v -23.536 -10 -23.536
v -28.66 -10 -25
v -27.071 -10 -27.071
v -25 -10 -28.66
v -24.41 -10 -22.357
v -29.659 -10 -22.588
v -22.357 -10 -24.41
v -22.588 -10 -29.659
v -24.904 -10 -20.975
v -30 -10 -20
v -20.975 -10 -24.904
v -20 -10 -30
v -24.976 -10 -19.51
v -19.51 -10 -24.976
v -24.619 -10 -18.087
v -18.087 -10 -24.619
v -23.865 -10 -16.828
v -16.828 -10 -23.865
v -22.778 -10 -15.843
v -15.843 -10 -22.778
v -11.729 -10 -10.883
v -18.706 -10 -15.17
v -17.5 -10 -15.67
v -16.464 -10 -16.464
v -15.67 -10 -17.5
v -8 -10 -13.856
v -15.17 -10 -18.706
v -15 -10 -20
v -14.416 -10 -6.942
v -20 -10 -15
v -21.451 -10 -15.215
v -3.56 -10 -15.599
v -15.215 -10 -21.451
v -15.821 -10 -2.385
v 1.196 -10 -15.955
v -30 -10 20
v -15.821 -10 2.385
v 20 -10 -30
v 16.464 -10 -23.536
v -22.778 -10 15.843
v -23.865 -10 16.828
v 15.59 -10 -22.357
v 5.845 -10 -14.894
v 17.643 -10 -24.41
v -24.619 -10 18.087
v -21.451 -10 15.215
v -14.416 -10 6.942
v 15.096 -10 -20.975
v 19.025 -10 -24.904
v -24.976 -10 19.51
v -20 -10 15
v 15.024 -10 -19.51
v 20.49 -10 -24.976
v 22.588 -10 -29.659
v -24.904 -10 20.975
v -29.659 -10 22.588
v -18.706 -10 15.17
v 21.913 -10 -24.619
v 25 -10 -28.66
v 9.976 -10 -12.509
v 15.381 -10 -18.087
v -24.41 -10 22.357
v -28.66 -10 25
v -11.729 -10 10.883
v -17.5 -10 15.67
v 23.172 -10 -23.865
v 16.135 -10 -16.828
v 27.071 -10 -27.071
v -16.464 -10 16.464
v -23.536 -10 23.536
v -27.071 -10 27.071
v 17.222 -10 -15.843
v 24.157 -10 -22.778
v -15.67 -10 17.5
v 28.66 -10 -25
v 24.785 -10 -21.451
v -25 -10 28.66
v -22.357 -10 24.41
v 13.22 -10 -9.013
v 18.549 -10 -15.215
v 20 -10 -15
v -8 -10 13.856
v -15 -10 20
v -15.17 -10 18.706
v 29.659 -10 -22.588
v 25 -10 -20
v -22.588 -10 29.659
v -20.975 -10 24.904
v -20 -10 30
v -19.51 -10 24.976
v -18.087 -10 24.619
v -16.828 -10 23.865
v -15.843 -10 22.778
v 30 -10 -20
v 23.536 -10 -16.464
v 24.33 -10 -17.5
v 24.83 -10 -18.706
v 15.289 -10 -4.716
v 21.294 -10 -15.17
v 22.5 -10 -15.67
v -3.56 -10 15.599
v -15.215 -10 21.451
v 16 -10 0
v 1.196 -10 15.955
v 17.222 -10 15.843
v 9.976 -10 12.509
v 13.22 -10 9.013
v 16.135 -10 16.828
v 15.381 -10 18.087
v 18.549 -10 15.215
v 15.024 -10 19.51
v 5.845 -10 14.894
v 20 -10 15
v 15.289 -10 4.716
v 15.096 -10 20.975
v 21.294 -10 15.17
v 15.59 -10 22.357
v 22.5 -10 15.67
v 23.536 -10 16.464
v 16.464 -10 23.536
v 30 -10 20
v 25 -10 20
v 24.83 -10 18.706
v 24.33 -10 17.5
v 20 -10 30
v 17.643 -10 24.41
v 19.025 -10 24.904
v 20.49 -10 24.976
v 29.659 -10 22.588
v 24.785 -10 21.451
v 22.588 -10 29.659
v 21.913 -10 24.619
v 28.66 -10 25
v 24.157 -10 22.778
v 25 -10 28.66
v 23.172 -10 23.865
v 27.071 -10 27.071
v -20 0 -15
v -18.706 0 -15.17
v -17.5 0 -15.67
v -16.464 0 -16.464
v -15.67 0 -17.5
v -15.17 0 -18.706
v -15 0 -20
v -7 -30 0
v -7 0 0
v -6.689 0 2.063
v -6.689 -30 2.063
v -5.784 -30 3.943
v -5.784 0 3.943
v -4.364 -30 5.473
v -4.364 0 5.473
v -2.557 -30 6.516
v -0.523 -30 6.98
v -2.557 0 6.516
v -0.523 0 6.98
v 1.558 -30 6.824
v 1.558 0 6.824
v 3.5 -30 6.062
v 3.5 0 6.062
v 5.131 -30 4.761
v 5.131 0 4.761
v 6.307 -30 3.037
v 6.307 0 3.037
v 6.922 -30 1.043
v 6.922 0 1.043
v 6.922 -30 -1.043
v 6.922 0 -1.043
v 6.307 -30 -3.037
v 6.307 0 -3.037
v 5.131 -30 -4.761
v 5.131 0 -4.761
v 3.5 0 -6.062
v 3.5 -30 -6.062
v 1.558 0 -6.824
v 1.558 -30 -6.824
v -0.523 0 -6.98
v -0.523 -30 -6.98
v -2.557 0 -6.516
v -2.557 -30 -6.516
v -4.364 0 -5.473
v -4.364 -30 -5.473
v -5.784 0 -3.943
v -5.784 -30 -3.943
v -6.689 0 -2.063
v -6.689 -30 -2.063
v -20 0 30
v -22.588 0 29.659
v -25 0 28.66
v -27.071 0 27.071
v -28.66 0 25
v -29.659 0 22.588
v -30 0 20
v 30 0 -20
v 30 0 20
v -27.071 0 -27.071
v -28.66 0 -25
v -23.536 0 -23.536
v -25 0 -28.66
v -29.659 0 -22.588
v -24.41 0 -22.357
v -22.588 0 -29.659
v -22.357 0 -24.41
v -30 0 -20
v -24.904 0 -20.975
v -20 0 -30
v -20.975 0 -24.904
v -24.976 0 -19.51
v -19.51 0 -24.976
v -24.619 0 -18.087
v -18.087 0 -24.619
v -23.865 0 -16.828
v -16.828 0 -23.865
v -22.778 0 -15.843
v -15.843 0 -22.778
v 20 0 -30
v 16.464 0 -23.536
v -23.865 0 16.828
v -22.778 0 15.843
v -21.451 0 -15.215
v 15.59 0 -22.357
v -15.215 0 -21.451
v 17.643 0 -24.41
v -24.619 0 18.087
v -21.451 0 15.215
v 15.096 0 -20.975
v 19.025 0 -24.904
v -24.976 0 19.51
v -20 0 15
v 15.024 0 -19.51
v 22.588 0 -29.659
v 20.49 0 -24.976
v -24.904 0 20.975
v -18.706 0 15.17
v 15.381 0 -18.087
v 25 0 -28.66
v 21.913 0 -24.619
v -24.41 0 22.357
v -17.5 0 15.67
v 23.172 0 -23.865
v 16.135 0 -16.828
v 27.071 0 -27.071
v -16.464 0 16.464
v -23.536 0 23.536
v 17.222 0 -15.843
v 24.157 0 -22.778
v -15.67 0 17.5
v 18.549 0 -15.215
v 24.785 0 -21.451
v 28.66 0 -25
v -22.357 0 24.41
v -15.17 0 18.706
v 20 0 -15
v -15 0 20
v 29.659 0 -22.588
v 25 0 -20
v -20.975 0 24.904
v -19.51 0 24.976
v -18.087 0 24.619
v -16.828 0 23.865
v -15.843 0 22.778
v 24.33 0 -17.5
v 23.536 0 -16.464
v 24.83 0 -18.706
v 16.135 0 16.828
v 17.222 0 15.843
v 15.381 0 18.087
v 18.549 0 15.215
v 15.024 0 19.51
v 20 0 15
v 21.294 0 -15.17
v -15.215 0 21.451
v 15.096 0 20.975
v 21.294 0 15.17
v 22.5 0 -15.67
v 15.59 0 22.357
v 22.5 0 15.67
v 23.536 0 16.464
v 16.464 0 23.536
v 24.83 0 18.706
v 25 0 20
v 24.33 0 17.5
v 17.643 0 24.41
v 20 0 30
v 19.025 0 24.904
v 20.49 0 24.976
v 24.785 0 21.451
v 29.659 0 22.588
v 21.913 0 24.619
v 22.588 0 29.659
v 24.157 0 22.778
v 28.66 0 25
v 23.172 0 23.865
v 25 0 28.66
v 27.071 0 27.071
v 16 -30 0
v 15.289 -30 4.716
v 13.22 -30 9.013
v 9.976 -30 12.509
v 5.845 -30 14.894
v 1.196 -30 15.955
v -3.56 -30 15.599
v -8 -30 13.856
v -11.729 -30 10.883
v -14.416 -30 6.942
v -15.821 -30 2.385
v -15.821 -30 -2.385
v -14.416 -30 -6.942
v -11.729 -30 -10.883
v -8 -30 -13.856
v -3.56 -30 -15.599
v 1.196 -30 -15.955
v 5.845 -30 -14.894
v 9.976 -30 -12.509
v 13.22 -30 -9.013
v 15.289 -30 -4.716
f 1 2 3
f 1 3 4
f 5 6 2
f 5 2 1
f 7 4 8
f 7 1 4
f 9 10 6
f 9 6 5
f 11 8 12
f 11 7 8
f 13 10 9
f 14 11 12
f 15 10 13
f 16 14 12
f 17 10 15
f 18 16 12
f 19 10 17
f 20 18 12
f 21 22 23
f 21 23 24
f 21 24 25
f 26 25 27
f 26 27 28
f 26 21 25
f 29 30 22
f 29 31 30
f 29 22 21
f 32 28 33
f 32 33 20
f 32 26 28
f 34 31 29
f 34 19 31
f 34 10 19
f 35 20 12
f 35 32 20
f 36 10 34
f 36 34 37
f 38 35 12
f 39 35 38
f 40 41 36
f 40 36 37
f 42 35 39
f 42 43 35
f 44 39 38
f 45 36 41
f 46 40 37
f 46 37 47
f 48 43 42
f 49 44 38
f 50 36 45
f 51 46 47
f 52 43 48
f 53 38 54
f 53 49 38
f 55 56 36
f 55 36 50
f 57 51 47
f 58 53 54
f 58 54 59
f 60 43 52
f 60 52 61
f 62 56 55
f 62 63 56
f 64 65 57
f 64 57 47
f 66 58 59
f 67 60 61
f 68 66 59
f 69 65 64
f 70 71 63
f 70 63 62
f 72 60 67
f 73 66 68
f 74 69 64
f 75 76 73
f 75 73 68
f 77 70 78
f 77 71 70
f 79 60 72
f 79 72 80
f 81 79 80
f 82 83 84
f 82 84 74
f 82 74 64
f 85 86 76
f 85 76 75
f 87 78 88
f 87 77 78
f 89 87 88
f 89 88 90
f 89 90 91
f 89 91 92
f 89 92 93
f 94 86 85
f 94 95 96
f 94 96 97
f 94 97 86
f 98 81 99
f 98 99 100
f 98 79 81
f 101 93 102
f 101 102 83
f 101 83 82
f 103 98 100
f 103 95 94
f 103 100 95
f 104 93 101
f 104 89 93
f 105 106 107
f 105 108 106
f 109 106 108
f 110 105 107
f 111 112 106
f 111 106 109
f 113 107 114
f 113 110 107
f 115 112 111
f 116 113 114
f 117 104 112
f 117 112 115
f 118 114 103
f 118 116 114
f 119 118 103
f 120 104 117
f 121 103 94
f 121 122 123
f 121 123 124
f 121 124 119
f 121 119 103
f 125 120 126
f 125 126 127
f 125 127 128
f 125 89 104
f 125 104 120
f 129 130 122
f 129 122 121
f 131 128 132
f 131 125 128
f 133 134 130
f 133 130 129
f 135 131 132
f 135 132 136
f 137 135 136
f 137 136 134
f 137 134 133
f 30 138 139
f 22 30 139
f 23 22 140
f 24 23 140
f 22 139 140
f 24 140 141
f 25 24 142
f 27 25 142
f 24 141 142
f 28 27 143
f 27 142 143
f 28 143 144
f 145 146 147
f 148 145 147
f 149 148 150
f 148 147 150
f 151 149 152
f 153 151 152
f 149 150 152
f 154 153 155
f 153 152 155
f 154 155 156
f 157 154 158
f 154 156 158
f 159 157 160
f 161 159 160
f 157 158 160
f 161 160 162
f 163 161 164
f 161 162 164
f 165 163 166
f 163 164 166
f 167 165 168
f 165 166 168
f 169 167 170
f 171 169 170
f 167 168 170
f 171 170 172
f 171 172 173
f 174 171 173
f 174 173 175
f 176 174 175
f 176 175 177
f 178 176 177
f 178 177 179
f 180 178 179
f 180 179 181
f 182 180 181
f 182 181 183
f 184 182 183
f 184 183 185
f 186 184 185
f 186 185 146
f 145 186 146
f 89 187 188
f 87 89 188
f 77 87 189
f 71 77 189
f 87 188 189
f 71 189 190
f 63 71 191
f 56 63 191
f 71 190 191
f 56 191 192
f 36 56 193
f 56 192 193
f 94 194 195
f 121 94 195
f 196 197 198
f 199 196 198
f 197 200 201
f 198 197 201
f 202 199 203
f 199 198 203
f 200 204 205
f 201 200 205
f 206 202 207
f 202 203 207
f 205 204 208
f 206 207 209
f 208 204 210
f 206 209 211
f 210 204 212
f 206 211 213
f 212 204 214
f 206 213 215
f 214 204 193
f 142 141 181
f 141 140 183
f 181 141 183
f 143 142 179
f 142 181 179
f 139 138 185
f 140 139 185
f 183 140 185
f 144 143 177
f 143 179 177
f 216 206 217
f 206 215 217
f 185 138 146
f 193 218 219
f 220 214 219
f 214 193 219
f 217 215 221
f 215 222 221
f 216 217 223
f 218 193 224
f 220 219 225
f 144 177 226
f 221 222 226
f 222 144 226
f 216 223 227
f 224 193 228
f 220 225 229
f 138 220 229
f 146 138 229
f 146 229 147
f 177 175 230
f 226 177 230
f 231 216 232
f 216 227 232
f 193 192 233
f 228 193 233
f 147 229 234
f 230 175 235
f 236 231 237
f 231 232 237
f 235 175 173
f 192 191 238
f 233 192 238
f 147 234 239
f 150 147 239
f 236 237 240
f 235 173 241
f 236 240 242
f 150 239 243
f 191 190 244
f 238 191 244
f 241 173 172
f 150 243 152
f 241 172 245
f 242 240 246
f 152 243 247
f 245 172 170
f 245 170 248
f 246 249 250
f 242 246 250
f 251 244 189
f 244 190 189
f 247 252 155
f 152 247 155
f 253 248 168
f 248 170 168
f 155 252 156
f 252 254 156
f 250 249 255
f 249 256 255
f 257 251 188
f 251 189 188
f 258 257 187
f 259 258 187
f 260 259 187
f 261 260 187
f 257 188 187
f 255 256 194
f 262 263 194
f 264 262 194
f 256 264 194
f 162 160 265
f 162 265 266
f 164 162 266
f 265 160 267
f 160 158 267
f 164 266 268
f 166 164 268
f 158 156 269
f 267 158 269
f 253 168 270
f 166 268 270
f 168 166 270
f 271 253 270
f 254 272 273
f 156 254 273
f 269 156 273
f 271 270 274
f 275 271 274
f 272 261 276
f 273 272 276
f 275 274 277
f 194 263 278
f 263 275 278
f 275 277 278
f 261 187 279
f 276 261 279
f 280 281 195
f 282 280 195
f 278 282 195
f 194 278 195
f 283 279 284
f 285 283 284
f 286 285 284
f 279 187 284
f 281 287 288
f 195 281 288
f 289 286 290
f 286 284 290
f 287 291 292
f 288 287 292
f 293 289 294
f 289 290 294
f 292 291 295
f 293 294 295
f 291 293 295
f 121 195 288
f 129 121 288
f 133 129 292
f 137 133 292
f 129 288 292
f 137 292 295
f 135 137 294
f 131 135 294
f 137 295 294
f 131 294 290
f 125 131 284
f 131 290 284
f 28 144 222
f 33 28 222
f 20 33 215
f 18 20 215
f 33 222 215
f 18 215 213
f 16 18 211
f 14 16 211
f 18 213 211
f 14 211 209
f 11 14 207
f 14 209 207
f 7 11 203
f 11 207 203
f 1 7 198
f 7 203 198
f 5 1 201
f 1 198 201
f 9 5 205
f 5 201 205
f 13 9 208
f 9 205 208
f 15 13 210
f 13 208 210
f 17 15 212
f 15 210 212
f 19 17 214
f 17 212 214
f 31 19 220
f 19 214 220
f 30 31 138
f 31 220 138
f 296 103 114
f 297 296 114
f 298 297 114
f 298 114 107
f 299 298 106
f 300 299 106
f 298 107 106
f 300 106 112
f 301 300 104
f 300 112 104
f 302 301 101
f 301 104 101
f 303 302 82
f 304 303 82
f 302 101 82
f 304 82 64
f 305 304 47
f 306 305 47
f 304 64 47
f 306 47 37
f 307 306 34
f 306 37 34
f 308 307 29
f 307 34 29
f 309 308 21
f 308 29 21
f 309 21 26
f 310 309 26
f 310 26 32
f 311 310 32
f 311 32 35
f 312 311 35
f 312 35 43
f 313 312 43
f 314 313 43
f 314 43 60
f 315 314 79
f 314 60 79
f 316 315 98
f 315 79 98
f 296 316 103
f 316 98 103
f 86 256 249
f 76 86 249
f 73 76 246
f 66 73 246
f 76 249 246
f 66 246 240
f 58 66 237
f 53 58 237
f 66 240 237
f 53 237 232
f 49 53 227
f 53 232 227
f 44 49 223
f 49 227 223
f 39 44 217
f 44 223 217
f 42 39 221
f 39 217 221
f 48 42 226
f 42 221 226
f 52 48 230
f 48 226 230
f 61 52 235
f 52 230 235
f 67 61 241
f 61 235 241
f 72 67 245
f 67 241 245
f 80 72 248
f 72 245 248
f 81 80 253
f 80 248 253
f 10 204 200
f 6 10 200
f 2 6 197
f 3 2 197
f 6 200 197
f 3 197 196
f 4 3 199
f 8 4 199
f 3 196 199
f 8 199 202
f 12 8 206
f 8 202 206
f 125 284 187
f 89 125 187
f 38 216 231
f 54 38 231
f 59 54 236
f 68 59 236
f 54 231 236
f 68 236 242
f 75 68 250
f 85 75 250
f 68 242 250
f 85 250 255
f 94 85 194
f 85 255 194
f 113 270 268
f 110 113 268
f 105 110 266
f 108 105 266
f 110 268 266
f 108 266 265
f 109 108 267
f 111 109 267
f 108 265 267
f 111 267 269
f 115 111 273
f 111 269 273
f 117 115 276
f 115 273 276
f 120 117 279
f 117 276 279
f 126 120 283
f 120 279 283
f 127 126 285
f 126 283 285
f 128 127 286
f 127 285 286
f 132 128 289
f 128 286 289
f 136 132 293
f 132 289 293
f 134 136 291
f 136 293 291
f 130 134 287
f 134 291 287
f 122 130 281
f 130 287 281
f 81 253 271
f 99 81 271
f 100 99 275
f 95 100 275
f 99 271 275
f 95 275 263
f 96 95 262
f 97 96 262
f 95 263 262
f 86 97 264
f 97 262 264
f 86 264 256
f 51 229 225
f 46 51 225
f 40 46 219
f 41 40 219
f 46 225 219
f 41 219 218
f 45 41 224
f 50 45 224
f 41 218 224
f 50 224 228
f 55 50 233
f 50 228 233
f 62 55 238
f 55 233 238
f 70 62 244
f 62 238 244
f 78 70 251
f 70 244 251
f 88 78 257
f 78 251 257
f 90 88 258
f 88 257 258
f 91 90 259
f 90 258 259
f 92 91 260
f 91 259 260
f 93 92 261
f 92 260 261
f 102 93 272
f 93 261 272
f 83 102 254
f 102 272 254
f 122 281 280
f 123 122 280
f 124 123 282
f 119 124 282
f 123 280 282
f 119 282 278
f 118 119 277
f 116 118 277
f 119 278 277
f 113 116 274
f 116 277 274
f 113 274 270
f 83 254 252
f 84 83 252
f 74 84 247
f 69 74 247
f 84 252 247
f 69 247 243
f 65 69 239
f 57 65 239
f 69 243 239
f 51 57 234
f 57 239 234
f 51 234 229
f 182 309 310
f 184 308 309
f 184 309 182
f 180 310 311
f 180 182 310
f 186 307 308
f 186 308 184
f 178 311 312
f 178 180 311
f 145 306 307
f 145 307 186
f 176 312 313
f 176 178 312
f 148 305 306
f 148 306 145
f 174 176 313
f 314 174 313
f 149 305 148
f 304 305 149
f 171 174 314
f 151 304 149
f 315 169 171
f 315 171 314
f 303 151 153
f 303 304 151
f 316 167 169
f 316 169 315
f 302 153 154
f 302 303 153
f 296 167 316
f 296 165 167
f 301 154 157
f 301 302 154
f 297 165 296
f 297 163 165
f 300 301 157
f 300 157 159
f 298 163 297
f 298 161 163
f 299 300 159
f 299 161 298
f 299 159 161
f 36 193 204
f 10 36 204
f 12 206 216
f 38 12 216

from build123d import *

# Parameters (mm, degrees)
F1_DEPTH = 10
F2_R     = 16
F3_DEPTH = 20
F5_D     = 14


with BuildPart() as f1:
    # F0 (on Front) → F1 (new body)
    with BuildSketch(Plane.XZ):
        with BuildLine():
            ThreePointArc((-16, 0), (0, 16), (16, 0))
            Line((16, 0), (20, 0))
            Line((20, 0), (20, 10))
            ThreePointArc((20, 10), (10, 20), (20, 30))
            Line((20, 30), (-20, 30))
            ThreePointArc((-20, 30), (-12.9289321881, 27.0710678119), (-10, 20))
            ThreePointArc((-10, 20), (-12.9289321881, 12.9289321881), (-20, 10))
            Line((-20, 10), (-20, 0))
            Line((-20, 0), (-16, 0))
        make_face()
        with BuildLine():
            Line((20, 0), (16, 0))
            ThreePointArc((16, 0), (0, -16), (-16, 0))
            Line((-16, 0), (-20, 0))
            Line((-20, 0), (-20, -10))
            ThreePointArc((-20, -10), (-12.9289321881, -12.9289321881), (-10, -20))
            ThreePointArc((-10, -20), (-12.9289321881, -27.0710678119), (-20, -30))
            Line((-20, -30), (20, -30))
            ThreePointArc((20, -30), (10, -20), (20, -10))
            Line((20, -10), (20, 0))
        make_face()
        with BuildLine():
            Line((20, 10), (20, 0))
            Line((20, 0), (20, -10))
            ThreePointArc((20, -10), (27.0710678119, -12.9289321881), (30, -20))
            Line((30, -20), (30, 20))
            ThreePointArc((30, 20), (27.0710678119, 12.9289321881), (20, 10))
        make_face()
        with BuildLine():
            ThreePointArc((20, 30), (10, 20), (20, 10))
            ThreePointArc((20, 10), (27.0710678119, 12.9289321881), (30, 20))
            ThreePointArc((30, 20), (27.0710678119, 27.0710678119), (20, 30))
        make_face()
        with BuildLine():
            ThreePointArc((25, 20), (23.5355339059, 16.4644660941), (20, 15))
            ThreePointArc((20, 15), (16.4644660941, 23.5355339059), (25, 20))
        make_face(mode=Mode.SUBTRACT)
        with BuildLine():
            ThreePointArc((-30, 20), (-27.0710678119, 12.9289321881), (-20, 10))
            ThreePointArc((-20, 10), (-12.9289321881, 12.9289321881), (-10, 20))
            ThreePointArc((-10, 20), (-12.9289321881, 27.0710678119), (-20, 30))
            ThreePointArc((-20, 30), (-27.0710678119, 27.0710678119), (-30, 20))
        make_face()
        with BuildLine():
            ThreePointArc((-15, 20), (-16.4644660941, 16.4644660941), (-20, 15))
            ThreePointArc((-20, 15), (-23.5355339059, 23.5355339059), (-15, 20))
        make_face(mode=Mode.SUBTRACT)
        with BuildLine():
            Line((-20, -10), (-20, 0))
            Line((-20, 0), (-20, 10))
            ThreePointArc((-20, 10), (-27.0710678119, 12.9289321881), (-30, 20))
            Line((-30, 20), (-30, -20))
            ThreePointArc((-30, -20), (-27.0710678119, -12.9289321881), (-20, -10))
        make_face()
        with BuildLine():
            ThreePointArc((-10, -20), (-12.9289321881, -12.9289321881), (-20, -10))
            ThreePointArc((-20, -10), (-27.0710678119, -12.9289321881), (-30, -20))
            ThreePointArc((-30, -20), (-27.0710678119, -27.0710678119), (-20, -30))
            ThreePointArc((-20, -30), (-12.9289321881, -27.0710678119), (-10, -20))
        make_face()
        with BuildLine():
            ThreePointArc((-15, -20), (-23.5355339059, -23.5355339059), (-20, -15))
            ThreePointArc((-20, -15), (-16.4644660941, -16.4644660941), (-15, -20))
        make_face(mode=Mode.SUBTRACT)
        with BuildLine():
            ThreePointArc((30, -20), (27.0710678119, -12.9289321881), (20, -10))
            ThreePointArc((20, -10), (10, -20), (20, -30))
            ThreePointArc((20, -30), (27.0710678119, -27.0710678119), (30, -20))
        make_face()
        with BuildLine():
            ThreePointArc((25, -20), (16.4644660941, -23.5355339059), (20, -15))
            ThreePointArc((20, -15), (23.5355339059, -16.4644660941), (25, -20))
        make_face(mode=Mode.SUBTRACT)
        with BuildLine():
            Line((0, 0), (16, 0))
            ThreePointArc((16, 0), (0, 16), (-16, 0))
            Line((-16, 0), (0, 0))
        make_face()
        with BuildLine():
            ThreePointArc((-16, 0), (0, -16), (16, 0))
            Line((16, 0), (0, 0))
            Line((0, 0), (-16, 0))
        make_face()
    extrude(amount=F1_DEPTH)

    # F2 (on face) → F3 (join)
    with BuildSketch(Plane.XZ.offset(10)):
        Circle(F2_R)
    extrude(amount=F3_DEPTH)

    # F5 (through all)
    with Locations(Plane.XZ.offset(30)):
        with Locations((0, 0)):
            Hole(F5_D / 2)


solid = f1.part
